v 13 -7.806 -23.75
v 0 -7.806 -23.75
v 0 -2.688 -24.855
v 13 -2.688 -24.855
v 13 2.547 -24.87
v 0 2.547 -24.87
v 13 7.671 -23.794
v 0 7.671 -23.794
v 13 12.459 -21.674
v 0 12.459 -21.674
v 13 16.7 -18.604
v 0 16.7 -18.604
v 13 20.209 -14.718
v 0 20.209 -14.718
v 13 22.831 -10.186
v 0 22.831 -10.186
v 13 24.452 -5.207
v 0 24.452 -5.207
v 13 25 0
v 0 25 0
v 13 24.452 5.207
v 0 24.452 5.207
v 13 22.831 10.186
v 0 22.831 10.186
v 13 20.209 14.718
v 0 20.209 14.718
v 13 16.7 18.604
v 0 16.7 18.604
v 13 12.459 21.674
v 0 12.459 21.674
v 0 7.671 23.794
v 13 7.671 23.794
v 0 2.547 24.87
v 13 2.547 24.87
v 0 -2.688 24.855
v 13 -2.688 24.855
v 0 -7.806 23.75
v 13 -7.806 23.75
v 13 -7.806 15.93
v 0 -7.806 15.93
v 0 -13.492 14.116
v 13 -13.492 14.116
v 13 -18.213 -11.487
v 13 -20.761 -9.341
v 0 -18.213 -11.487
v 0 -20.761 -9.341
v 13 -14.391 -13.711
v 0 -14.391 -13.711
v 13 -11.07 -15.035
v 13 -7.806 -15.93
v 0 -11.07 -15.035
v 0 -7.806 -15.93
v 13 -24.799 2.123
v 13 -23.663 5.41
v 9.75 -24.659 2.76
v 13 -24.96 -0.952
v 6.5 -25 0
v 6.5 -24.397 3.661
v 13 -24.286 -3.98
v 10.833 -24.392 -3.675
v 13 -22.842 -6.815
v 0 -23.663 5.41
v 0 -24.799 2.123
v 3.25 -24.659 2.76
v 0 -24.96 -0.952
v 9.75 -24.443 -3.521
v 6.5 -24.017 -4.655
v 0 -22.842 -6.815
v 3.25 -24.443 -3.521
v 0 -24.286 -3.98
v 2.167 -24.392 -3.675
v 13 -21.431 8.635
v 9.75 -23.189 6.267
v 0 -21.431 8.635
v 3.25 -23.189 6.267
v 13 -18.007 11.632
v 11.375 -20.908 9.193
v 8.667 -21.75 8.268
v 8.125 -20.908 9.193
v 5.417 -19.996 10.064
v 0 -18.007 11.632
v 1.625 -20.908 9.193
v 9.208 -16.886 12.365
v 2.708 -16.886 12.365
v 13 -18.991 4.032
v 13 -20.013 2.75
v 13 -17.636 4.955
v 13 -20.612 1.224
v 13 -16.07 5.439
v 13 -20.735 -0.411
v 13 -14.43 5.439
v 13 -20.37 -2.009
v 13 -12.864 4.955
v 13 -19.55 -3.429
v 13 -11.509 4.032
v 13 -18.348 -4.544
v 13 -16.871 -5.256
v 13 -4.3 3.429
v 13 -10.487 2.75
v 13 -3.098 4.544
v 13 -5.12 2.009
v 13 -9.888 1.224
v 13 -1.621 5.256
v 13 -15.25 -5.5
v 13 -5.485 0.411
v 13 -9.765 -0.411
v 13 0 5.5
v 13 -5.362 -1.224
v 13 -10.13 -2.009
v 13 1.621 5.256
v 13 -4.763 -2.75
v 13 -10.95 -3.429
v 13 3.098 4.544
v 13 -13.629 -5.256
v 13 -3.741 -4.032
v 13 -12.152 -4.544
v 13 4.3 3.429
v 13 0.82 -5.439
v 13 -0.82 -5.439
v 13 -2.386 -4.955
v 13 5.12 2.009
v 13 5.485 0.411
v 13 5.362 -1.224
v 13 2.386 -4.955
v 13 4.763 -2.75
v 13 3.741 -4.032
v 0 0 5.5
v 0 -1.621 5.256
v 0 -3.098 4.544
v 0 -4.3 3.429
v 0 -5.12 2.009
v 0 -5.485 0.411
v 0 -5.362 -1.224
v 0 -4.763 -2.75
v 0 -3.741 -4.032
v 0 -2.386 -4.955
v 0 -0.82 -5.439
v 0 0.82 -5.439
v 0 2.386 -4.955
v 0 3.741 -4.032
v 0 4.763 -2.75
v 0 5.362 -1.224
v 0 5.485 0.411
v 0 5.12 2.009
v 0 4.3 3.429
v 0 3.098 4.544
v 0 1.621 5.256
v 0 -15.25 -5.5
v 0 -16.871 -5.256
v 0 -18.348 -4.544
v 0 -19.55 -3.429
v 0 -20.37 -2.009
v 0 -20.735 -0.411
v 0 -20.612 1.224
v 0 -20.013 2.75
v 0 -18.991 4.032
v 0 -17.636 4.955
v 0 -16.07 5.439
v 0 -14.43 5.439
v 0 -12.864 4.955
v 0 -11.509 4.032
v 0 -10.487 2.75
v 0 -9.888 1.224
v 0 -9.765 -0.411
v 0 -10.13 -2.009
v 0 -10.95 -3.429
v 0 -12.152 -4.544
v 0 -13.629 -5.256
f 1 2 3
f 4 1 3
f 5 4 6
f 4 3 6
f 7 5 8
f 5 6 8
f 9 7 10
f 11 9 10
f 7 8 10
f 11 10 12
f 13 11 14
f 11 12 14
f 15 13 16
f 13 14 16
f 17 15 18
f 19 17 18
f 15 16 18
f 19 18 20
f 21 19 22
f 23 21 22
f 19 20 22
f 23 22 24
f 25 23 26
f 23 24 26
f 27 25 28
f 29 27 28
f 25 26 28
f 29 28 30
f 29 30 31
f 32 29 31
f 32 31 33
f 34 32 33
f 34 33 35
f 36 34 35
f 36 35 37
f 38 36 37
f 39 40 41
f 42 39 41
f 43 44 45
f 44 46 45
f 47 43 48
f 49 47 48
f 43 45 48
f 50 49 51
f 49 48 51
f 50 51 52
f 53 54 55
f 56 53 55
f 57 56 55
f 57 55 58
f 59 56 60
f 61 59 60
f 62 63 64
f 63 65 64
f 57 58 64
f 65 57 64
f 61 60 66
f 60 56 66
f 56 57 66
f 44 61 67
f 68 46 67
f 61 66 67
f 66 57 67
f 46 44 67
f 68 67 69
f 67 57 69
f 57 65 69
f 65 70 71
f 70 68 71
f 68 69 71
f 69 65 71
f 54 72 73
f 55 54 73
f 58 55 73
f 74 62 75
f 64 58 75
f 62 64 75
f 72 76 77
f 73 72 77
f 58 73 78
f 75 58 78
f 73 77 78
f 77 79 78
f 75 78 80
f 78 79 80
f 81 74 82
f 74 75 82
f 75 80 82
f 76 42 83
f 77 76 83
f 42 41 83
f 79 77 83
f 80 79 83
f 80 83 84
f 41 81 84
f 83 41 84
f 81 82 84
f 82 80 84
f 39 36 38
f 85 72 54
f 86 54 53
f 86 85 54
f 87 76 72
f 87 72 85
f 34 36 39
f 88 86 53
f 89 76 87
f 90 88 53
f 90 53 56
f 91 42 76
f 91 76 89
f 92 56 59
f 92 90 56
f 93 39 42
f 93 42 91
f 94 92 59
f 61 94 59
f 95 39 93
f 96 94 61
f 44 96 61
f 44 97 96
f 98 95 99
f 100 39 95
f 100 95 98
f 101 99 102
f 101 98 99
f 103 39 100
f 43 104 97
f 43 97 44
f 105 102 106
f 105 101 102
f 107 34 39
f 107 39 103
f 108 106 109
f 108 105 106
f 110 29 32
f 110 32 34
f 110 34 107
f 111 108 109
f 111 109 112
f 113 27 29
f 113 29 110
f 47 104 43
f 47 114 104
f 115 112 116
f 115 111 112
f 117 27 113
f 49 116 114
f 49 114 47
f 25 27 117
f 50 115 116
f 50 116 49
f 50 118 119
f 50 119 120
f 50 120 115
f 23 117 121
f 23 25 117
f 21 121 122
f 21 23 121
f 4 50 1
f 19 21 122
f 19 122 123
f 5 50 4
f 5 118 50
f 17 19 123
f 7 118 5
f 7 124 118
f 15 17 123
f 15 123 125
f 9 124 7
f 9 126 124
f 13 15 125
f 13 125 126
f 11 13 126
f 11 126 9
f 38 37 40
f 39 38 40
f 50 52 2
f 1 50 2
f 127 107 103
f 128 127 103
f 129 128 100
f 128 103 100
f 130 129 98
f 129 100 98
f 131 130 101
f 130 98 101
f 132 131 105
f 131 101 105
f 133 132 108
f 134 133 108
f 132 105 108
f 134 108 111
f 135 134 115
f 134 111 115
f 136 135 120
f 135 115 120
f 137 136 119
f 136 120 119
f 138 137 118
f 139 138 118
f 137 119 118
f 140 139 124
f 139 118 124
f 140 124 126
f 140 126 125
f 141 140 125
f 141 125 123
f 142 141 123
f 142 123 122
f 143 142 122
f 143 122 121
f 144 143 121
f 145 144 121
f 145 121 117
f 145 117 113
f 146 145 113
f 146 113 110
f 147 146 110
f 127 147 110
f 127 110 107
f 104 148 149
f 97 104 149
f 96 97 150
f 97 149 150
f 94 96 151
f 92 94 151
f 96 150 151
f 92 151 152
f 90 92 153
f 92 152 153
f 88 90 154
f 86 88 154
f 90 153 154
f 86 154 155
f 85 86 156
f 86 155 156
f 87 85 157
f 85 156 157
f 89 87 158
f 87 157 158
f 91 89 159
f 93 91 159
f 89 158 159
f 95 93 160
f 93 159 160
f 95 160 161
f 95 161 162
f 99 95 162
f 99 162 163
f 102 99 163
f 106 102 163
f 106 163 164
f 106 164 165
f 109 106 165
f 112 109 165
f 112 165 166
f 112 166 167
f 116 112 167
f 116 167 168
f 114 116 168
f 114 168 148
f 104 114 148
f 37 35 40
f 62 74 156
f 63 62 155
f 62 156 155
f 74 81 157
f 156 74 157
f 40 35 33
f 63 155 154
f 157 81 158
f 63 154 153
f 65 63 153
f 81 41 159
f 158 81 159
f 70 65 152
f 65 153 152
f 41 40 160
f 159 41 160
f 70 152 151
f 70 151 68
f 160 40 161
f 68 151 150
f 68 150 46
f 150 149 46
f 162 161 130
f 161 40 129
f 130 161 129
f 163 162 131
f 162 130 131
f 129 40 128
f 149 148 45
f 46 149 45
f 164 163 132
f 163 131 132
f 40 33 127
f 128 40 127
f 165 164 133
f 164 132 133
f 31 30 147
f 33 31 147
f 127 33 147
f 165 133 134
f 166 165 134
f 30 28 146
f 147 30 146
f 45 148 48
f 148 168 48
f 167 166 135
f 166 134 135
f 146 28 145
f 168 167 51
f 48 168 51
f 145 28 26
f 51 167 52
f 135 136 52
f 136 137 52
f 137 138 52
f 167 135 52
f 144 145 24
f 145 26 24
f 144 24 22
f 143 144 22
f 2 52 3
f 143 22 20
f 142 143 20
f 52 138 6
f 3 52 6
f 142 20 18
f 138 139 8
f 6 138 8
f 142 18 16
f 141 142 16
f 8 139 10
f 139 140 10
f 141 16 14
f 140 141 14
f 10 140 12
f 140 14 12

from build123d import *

# Parameters (mm, degrees)
BOSS_EXTRUDE1_DEPTH             = 13
M10_CLEARANCE_HOLE2_D           = 11
M10_CLEARANCE_HOLE2_ON_FACE_2_D = 11
M10_CLEARANCE_HOLE1_D           = 11


with BuildPart() as part:
    # Sketch1 → Boss-Extrude1 (new body)
    with BuildSketch(Plane(origin=(0, 0, 0), x_dir=(0, 0, -1), z_dir=(1, 0, 0))):
        with BuildLine():
            Line((-23.749988068, -7.8062838), (-15.929764022, -7.8062838))
            add(Edge.make_bspline(
                [(-15.929764022, -7.8062838), (0, -80.063704579), (15.929764022, -7.8062838)],
                knots=[5.029950938, 5.029950938, 5.029950938, 7.536419676, 7.536419676, 7.536419676], degree=2, weights=[1, 0.312251352, 1]))
            Line((15.929764022, -7.8062838), (23.749988068, -7.8062838))
            ThreePointArc((23.749988068, -7.8062838), (0, 25), (-23.749988068, -7.8062838))
        make_face()
    extrude(amount=BOSS_EXTRUDE1_DEPTH)

    # M10 Clearance Hole2 (through all)
    with Locations(Plane(origin=(0, 0, 0), x_dir=(0, 0, -1), z_dir=(-1, 0, 0))):
        with Locations((0, 0)):
            Hole(M10_CLEARANCE_HOLE2_D / 2)

    # M10 Clearance Hole2 on face 2 (through all)
    with Locations(Plane(origin=(13, 0, 0), x_dir=(0, 0, 1), z_dir=(1, 0, 0))):
        with Locations((0, 0)):
            Hole(M10_CLEARANCE_HOLE2_ON_FACE_2_D / 2)

    # M10 Clearance Hole1 (through all)
    with Locations(Plane(origin=(13, -15.25, 0), x_dir=(0, 0, 1), z_dir=(1, 0, 0))):
        with Locations((0, 0)):
            Hole(M10_CLEARANCE_HOLE1_D / 2)


solid = part.part
